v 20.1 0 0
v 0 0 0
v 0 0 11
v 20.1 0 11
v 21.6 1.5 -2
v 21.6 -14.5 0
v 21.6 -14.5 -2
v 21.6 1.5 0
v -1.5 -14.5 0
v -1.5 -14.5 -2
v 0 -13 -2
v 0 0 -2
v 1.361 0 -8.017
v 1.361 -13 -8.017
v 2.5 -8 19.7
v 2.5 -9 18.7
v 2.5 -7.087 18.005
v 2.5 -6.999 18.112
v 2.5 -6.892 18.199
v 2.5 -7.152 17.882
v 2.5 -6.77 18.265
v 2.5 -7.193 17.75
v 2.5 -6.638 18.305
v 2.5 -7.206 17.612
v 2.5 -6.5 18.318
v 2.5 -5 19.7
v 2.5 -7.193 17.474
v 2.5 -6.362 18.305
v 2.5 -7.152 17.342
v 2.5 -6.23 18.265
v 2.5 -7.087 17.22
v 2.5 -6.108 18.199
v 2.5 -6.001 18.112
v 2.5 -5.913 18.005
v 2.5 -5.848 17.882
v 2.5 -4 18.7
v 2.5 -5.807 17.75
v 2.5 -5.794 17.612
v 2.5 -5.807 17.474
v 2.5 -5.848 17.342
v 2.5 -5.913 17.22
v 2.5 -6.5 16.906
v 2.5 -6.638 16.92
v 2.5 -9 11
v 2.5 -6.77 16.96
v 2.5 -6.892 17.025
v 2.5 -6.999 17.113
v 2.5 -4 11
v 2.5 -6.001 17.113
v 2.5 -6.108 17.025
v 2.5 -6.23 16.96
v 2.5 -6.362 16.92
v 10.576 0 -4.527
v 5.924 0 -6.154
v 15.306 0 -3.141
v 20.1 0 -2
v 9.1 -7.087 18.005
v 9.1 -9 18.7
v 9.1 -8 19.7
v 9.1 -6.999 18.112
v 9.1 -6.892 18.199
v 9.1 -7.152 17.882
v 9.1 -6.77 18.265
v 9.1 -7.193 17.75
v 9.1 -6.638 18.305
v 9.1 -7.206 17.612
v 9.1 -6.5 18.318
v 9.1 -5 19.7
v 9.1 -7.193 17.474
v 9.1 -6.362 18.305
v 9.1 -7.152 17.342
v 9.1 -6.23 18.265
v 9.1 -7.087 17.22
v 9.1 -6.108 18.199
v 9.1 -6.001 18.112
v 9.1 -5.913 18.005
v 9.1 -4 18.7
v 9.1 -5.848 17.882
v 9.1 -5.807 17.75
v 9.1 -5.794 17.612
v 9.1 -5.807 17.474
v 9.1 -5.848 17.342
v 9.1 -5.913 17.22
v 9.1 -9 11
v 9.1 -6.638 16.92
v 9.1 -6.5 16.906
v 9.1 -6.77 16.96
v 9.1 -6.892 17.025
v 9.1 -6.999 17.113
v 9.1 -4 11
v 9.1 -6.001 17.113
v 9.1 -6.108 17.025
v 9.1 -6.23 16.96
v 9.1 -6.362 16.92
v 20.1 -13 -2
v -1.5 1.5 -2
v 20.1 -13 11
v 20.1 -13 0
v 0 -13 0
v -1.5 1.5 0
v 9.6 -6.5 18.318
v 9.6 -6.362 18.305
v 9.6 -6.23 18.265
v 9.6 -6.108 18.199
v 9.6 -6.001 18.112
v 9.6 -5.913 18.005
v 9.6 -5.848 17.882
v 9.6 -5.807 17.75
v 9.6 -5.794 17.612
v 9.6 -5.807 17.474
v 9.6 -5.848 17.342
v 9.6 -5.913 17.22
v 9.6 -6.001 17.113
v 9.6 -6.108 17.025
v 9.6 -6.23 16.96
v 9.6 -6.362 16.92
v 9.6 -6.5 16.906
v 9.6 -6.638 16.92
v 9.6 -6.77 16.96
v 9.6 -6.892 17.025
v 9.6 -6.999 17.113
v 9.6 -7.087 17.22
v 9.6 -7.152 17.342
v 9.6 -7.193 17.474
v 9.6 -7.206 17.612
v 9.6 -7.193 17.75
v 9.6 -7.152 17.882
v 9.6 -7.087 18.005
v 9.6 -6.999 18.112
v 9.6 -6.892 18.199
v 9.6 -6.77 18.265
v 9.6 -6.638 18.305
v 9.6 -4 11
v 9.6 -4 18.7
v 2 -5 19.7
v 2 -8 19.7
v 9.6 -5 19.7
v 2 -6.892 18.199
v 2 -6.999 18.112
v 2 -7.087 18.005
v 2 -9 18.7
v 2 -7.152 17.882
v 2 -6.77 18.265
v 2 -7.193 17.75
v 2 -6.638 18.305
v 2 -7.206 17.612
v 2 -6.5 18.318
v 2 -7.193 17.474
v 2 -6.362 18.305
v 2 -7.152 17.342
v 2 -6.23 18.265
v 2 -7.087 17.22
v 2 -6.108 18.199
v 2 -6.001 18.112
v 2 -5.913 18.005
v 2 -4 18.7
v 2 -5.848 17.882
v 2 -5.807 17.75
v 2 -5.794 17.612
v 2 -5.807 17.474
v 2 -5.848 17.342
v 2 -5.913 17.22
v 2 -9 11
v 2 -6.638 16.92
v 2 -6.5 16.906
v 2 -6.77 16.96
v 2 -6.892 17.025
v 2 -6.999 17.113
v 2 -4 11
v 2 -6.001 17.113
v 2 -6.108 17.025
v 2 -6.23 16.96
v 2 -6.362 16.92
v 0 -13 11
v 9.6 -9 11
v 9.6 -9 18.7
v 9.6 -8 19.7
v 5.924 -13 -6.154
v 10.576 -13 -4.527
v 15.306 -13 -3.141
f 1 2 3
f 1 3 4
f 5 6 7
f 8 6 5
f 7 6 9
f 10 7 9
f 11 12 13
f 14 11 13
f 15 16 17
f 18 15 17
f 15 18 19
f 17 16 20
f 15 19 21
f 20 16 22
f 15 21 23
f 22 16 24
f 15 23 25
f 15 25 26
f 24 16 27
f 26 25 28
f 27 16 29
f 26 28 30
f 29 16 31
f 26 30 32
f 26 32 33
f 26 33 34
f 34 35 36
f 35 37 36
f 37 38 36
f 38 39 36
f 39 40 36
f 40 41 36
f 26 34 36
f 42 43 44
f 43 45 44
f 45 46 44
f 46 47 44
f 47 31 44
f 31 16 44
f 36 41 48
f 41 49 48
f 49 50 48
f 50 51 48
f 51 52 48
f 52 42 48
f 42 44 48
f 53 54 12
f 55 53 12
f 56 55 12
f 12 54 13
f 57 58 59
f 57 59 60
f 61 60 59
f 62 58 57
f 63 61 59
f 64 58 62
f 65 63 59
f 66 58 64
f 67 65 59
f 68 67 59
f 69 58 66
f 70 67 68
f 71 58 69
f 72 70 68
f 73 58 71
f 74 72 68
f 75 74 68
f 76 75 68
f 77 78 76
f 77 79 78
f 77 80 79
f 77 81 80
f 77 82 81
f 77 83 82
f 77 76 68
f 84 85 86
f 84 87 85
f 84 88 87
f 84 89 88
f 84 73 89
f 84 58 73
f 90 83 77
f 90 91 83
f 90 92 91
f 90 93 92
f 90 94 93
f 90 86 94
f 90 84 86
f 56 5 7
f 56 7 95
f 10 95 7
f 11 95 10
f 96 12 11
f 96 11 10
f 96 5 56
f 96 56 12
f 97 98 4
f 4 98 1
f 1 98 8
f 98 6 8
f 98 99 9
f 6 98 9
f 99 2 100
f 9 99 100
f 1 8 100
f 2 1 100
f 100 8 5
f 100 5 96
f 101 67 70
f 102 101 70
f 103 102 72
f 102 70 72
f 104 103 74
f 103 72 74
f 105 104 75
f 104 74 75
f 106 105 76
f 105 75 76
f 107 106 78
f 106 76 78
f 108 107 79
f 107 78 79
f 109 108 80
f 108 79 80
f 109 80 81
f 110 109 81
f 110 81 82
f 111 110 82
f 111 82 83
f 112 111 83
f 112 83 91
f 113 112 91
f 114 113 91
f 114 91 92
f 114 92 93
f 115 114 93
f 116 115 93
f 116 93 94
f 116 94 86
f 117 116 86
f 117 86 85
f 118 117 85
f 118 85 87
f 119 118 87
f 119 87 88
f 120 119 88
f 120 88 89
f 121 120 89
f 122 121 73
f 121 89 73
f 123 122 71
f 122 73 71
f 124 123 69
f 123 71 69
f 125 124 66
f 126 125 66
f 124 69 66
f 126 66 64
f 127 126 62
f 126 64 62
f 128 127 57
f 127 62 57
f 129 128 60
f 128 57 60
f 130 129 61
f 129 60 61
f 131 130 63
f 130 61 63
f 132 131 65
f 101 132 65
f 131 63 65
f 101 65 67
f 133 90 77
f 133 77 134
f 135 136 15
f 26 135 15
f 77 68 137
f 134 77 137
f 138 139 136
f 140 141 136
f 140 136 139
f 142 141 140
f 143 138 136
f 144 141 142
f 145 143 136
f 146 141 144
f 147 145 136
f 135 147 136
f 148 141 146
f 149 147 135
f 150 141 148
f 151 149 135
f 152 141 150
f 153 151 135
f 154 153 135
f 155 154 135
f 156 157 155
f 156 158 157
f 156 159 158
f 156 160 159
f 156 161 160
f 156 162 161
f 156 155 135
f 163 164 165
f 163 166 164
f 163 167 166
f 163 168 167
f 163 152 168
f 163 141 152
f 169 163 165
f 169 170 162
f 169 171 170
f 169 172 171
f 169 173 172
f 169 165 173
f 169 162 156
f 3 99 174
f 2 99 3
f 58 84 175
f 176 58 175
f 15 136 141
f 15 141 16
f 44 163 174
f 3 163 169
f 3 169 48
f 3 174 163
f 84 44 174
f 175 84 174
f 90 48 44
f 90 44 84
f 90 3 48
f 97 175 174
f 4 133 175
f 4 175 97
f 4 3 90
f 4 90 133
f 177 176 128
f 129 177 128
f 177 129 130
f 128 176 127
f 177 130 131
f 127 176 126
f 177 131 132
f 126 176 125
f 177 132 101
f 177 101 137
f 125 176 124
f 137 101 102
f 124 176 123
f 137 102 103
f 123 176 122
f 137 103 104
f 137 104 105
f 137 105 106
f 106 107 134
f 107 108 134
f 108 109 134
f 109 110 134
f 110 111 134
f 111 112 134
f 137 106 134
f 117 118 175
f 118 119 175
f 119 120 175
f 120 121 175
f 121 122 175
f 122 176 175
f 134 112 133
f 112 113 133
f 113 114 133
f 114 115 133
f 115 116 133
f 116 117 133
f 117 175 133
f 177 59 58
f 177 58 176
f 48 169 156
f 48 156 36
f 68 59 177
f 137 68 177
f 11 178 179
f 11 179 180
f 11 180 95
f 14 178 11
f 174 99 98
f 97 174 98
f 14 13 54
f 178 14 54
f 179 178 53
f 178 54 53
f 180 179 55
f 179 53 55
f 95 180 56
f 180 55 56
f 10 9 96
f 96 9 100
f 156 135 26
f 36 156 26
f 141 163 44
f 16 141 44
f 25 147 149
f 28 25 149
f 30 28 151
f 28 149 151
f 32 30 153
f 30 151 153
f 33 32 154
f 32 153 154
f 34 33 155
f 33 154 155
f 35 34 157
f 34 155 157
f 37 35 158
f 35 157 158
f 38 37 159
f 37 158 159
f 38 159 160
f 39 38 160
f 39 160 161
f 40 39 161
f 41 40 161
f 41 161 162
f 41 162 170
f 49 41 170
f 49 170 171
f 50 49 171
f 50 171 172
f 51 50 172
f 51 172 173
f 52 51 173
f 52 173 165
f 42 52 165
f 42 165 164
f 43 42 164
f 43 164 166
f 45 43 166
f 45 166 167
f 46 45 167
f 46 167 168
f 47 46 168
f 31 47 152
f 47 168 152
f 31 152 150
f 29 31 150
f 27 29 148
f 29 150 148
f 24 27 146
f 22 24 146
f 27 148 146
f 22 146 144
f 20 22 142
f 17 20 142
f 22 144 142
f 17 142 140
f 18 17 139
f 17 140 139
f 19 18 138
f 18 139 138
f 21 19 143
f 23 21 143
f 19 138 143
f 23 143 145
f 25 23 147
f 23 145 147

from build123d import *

# Parameters (mm, degrees)
SKIZZE1_W                       = 20.1
SKIZZE1_H                       = 13
AUFSATZ_LINEAR_AUSTRAGEN1_DEPTH = 11
SKIZZE2_W                       = 0.5
SKIZZE2_H                       = 5
AUFSATZ_LINEAR_AUSTRAGEN2_DEPTH = 8.7
SKIZZE4_R                       = 0.706106742
SCHNITT_LINEAR_AUSTRAGEN1_DEPTH = 8.7
FASE1_SIZE                      = 1
SKIZZE5_W                       = 23.1
SKIZZE5_H                       = 16
AUFSATZ_LINEAR_AUSTRAGEN3_DEPTH = 2
AUFSATZ_LINEAR_AUSTRAGEN4_DEPTH = 13


with BuildPart() as part:
    # Skizze1 → Aufsatz-Linear austragen1 (new body)
    with BuildSketch(Plane.XY):
        with Locations((10.05, -6.5)):
            Rectangle(SKIZZE1_W, SKIZZE1_H)
    extrude(amount=AUFSATZ_LINEAR_AUSTRAGEN1_DEPTH)

    # Skizze2 → Aufsatz-Linear austragen2 (add)
    with BuildSketch(Plane.XY.offset(11)):
        with Locations((2.25, -6.5)):
            Rectangle(SKIZZE2_W, SKIZZE2_H)
        with Locations((9.35, -6.5)):
            Rectangle(SKIZZE2_W, SKIZZE2_H)
    extrude(amount=AUFSATZ_LINEAR_AUSTRAGEN2_DEPTH)

    # Skizze4 → Schnitt-Linear austragen1 (cut)
    with BuildSketch(Plane.ZY.offset(-2)):
        with Locations((17.612214696, -6.5)):
            Circle(SKIZZE4_R)
    extrude(amount=-SCHNITT_LINEAR_AUSTRAGEN1_DEPTH, mode=Mode.SUBTRACT)

    # Fase1
    fase1_edges = [part.edges().sort_by_distance(p)[0] for p in [
        (2.25, -4, 19.7),
        (2.25, -9, 19.7),
        (9.35, -9, 19.7),
        (9.35, -4, 19.7),
    ]]
    chamfer(fase1_edges, length=FASE1_SIZE)

    # Skizze5 → Aufsatz-Linear austragen3 (add)
    with BuildSketch(Plane(origin=(0, 0, 0), x_dir=(-1, 0, 0), z_dir=(0, 0, -1))):
        with Locations((-10.05, -6.5)):
            Rectangle(SKIZZE5_W, SKIZZE5_H)
    extrude(amount=AUFSATZ_LINEAR_AUSTRAGEN3_DEPTH)

    # Skizze6 → Aufsatz-Linear austragen4 (add)
    with BuildSketch(Plane(origin=(0, 0, 0), x_dir=(1, 0, 0), z_dir=(0, 1, 0))):
        with BuildLine():
            Line((0, 2), (1.361035654, 8.016649053))
            ThreePointArc((1.361035654, 8.016649053), (10.576058723, 4.527258802), (20.1, 2))
            Line((20.1, 2), (0, 2))
        make_face()
    extrude(amount=-AUFSATZ_LINEAR_AUSTRAGEN4_DEPTH)


solid = part.part
